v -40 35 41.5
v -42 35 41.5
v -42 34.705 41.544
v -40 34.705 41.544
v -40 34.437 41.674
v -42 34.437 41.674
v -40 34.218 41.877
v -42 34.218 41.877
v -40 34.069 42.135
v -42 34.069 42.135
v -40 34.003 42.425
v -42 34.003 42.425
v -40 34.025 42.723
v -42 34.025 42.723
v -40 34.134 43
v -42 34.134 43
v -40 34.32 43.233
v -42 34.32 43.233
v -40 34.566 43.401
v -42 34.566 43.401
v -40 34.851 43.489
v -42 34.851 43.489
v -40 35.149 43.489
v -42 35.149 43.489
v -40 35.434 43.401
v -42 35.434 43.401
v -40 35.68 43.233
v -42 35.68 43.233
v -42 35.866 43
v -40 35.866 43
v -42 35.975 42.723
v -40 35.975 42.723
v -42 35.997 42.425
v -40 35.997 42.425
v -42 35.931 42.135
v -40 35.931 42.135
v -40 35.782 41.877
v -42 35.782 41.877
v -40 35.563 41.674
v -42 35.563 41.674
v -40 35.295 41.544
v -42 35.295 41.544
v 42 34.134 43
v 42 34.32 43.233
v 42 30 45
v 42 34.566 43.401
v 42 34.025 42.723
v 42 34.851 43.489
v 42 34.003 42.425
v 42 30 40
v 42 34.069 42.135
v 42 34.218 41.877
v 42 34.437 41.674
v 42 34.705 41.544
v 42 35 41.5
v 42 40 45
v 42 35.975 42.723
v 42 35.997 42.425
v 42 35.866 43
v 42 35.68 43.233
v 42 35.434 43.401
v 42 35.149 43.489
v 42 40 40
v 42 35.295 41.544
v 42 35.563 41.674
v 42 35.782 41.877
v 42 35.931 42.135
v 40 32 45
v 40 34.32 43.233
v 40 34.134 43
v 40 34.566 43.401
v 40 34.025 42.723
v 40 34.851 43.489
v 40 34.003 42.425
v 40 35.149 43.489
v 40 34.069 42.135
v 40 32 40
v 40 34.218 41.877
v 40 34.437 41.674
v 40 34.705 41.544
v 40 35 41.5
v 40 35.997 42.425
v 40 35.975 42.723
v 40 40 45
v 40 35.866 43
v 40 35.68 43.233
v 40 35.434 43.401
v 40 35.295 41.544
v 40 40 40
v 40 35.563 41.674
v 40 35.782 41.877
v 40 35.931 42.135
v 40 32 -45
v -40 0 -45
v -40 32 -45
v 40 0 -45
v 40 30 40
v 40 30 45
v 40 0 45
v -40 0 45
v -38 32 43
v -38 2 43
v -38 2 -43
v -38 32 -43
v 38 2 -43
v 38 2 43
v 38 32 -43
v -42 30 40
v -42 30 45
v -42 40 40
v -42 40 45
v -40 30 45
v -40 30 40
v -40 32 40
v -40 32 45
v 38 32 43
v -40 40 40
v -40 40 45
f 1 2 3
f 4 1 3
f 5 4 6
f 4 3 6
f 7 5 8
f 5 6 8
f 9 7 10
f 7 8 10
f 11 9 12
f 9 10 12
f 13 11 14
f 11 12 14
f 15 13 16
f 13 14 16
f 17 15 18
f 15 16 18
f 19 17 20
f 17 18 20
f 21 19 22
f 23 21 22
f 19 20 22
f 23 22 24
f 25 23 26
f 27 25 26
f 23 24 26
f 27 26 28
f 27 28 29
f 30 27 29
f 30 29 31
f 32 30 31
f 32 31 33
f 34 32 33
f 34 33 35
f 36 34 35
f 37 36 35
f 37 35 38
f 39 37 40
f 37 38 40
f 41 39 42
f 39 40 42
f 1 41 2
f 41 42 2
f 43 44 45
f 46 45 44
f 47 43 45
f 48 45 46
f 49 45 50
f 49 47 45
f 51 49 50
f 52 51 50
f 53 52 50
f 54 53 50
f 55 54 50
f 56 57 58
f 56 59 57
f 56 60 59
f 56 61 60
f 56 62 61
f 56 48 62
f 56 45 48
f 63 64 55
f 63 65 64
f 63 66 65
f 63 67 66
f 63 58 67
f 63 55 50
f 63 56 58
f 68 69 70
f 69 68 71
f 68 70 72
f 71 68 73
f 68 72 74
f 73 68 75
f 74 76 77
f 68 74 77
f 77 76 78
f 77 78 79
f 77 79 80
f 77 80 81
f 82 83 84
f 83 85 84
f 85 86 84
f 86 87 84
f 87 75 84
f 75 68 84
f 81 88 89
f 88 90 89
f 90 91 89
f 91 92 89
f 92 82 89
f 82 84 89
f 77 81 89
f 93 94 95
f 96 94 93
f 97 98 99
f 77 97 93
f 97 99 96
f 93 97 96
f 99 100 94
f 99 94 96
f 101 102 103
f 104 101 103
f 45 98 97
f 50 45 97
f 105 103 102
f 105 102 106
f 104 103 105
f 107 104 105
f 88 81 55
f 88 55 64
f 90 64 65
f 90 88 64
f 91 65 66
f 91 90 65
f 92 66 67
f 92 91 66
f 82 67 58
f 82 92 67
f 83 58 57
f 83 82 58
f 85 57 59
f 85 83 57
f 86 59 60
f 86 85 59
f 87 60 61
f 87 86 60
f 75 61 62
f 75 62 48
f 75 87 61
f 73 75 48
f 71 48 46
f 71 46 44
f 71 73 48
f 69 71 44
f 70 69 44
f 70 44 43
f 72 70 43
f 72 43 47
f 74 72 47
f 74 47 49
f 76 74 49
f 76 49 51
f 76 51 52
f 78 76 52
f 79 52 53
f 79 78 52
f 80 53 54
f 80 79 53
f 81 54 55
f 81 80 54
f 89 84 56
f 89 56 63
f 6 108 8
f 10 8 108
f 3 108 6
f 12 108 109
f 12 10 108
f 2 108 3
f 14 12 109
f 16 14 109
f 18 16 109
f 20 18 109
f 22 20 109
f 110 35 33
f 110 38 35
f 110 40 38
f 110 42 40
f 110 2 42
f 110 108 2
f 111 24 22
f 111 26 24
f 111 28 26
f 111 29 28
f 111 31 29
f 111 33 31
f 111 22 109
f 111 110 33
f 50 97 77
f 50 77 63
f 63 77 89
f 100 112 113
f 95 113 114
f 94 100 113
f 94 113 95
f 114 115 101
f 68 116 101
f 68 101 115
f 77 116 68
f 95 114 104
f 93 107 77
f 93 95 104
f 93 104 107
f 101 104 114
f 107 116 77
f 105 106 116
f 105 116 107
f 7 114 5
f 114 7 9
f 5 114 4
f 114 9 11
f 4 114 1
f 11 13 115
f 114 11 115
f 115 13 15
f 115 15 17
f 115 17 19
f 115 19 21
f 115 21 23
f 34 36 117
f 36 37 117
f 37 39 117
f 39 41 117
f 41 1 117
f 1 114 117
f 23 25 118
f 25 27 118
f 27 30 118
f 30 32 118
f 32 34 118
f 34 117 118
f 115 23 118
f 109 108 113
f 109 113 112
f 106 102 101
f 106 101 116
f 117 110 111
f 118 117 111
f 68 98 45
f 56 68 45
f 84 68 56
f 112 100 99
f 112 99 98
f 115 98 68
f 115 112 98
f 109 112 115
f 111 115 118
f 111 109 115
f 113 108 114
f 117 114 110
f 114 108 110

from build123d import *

# Parameters (mm, degrees)
SKETCH1_W           = 80
SKETCH1_H           = 90
BOSS_EXTRUDE1_DEPTH = 2
SKETCH2_W           = 80
SKETCH2_H           = 90
SKETCH2_W_2         = 76
SKETCH2_H_2         = 86
BOSS_EXTRUDE2_DEPTH = 30
SKETCH4_W           = 5
SKETCH4_H           = 10
SKETCH4_R           = 1
BOSS_EXTRUDE3_DEPTH = 2
BOSS_EXTRUDE4_START = 2
SKETCH5_W           = 5
SKETCH5_H           = 10
SKETCH5_R           = 1
BOSS_EXTRUDE4_DEPTH = 2


with BuildPart() as part:
    # Sketch1 → Boss-Extrude1 (new body)
    with BuildSketch(Plane(origin=(0, 0, 0), x_dir=(1, 0, 0), z_dir=(0, 1, 0))):
        Rectangle(SKETCH1_W, SKETCH1_H)
    extrude(amount=BOSS_EXTRUDE1_DEPTH)

    # Sketch2 → Boss-Extrude2 (add)
    with BuildSketch(Plane(origin=(0, 2, 0), x_dir=(1, 0, 0), z_dir=(0, 1, 0))):
        Rectangle(SKETCH2_W, SKETCH2_H)
        Rectangle(SKETCH2_W_2, SKETCH2_H_2, mode=Mode.SUBTRACT)
    extrude(amount=BOSS_EXTRUDE2_DEPTH)

    # Sketch4 → Boss-Extrude3 (add)
    with BuildSketch(Plane(origin=(40, 0, 0), x_dir=(0, 0, -1), z_dir=(1, 0, 0))):
        with Locations((-42.5, 35)):
            Rectangle(SKETCH4_W, SKETCH4_H)
        with Locations((-42.5, 35)):
            Circle(SKETCH4_R, mode=Mode.SUBTRACT)
    extrude(amount=BOSS_EXTRUDE3_DEPTH)

    # Sketch5 → Boss-Extrude4 (add)
    with BuildSketch(Plane.ZY.offset(40).offset(BOSS_EXTRUDE4_START)):
        with Locations((42.5, 35)):
            Rectangle(SKETCH5_W, SKETCH5_H)
        with Locations(Location((42.5, 35, 0), (0, 0, 180))):
            Circle(SKETCH5_R, mode=Mode.SUBTRACT)
    extrude(amount=-BOSS_EXTRUDE4_DEPTH)


solid = part.part
